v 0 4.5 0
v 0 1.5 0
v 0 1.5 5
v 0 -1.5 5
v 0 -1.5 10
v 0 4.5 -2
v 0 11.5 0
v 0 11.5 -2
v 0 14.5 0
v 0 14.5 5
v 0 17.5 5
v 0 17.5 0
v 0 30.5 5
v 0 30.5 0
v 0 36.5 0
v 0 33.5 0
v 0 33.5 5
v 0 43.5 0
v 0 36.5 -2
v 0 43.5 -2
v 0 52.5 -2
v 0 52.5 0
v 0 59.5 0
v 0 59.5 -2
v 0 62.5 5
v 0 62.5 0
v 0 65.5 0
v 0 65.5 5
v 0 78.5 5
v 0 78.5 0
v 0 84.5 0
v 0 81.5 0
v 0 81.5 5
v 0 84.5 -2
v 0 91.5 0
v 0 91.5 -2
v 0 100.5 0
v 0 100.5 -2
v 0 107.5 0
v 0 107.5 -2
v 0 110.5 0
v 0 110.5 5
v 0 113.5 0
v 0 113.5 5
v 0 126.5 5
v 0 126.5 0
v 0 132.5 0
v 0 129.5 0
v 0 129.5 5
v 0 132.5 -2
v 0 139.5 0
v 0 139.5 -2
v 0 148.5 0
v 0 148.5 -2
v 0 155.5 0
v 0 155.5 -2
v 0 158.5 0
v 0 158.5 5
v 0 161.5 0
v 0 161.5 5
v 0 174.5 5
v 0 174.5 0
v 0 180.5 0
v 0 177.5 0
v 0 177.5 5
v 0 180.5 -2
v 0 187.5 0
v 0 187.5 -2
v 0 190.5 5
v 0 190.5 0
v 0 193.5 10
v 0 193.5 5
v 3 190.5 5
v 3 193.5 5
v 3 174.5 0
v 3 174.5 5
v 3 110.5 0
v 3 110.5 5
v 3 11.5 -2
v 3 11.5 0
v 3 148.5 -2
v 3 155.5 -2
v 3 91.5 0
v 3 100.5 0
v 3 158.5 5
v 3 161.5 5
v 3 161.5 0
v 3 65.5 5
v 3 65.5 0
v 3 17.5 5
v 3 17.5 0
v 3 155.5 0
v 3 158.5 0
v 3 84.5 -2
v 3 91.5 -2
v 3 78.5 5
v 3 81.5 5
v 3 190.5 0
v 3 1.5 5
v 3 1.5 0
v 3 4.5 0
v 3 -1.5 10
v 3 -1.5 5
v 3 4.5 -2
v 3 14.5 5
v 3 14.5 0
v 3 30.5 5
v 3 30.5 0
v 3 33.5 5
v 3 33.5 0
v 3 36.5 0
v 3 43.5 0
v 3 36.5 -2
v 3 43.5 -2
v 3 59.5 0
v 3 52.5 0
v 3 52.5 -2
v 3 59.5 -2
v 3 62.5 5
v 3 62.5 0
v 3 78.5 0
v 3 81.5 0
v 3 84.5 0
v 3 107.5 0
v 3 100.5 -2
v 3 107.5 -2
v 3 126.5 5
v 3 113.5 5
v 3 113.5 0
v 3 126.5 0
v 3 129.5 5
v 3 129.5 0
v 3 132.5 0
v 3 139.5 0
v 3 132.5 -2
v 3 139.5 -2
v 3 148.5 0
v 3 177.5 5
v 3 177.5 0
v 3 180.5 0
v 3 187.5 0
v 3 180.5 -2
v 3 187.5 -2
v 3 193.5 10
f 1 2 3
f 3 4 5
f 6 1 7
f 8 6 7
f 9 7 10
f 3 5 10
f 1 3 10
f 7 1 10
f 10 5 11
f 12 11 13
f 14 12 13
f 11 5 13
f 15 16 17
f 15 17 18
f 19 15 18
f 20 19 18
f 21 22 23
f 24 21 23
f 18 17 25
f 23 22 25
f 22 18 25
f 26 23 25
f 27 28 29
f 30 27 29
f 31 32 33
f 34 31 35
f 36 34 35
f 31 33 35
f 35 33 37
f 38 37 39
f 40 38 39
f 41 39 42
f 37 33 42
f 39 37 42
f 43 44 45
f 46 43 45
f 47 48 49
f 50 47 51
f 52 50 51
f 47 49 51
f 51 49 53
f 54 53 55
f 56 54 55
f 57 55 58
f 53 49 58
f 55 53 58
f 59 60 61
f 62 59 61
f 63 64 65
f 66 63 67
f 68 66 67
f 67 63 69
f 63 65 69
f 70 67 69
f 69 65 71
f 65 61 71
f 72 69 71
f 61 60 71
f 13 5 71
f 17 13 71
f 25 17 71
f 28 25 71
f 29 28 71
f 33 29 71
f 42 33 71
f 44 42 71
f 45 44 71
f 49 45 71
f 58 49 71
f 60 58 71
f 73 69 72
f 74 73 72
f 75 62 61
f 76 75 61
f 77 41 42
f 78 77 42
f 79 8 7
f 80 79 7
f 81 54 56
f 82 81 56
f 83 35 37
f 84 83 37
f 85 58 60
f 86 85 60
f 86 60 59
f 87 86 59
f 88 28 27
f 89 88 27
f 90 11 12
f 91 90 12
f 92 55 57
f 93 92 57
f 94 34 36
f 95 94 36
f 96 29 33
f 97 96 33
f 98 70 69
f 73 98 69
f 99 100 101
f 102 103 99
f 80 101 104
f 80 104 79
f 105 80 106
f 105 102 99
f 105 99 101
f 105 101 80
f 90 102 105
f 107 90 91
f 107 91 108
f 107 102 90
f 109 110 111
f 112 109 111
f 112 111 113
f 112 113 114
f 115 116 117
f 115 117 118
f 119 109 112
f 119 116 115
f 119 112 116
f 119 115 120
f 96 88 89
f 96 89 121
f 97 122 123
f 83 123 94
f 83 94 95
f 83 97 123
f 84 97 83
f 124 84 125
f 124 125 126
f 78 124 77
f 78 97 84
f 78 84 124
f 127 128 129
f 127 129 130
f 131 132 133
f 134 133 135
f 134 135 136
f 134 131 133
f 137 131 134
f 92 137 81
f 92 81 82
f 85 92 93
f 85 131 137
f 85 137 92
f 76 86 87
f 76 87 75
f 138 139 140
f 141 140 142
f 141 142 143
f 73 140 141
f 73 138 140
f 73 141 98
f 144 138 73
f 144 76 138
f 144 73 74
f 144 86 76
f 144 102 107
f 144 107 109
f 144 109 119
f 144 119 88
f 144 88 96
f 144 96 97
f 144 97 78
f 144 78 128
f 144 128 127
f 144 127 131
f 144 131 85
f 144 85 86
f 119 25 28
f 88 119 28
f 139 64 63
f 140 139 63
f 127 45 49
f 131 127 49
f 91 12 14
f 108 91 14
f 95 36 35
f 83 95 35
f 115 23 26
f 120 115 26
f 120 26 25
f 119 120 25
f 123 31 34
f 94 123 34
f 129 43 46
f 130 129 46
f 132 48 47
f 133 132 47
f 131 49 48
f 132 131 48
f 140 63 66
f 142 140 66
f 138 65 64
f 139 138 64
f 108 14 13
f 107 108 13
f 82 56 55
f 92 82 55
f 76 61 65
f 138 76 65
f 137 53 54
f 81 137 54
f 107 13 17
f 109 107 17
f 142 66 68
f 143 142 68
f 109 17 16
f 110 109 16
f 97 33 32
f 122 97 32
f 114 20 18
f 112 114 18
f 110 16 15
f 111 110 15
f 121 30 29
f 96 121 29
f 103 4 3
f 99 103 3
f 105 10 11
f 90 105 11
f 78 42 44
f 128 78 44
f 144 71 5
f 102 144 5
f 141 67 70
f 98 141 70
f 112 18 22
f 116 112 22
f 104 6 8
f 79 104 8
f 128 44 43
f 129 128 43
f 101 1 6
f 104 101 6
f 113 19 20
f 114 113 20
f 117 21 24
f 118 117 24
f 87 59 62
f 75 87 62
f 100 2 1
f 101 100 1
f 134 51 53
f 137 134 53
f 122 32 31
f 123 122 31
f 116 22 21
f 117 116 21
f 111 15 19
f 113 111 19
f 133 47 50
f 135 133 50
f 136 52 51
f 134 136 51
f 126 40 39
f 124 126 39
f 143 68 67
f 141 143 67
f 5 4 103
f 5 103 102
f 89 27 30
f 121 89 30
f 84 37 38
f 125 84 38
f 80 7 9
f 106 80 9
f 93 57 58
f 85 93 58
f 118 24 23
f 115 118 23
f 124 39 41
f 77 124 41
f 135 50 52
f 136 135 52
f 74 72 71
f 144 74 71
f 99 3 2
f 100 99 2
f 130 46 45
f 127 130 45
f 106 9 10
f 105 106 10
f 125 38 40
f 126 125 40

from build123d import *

# Parameters (mm, degrees)
F0_W     = 3
F0_H     = 5
F0_W_2   = 1.5
F1_DEPTH = 3


with BuildPart() as f1:
    # F0 (on Right) → F1 (new body)
    with BuildSketch(Plane.YZ):
        Polygon((1.5, 5), (1.5, 0), (4.5, 0), (4.5, -2), (11.5, -2), (11.5, 0), (14.5, 0), (14.5, 5), (14.5, 10), (11.5, 10), (1.5, 10), align=None)
        with Locations((16, 7.5)):
            Rectangle(F0_W, F0_H)
        Polygon((20.5, 10), (17.5, 10), (17.5, 5), (17.5, 0), (30.5, 0), (30.5, 5), (30.5, 10), align=None)
        with Locations((32, 7.5)):
            Rectangle(F0_W, F0_H)
        Polygon((33.5, 5), (33.5, 0), (36.5, 0), (36.5, -2), (43.5, -2), (43.5, 0), (48, 0), (52.5, 0), (52.5, -2), (59.5, -2), (59.5, 0), (62.5, 0), (62.5, 5), (62.5, 10), (33.5, 10), align=None)
        with Locations((64, 7.5)):
            Rectangle(F0_W, F0_H)
        Polygon((78.5, 10), (65.5, 10), (65.5, 5), (65.5, 0), (78.5, 0), (78.5, 5), align=None)
        with Locations((80, 7.5)):
            Rectangle(F0_W, F0_H)
        Polygon((110.5, 10), (81.5, 10), (81.5, 5), (81.5, 0), (84.5, 0), (84.5, -2), (91.5, -2), (91.5, 0), (96, 0), (100.5, 0), (100.5, -2), (107.5, -2), (107.5, 0), (110.5, 0), (110.5, 5), align=None)
        with Locations((112, 7.5)):
            Rectangle(F0_W, F0_H)
        Polygon((126.5, 10), (113.5, 10), (113.5, 5), (113.5, 0), (126.5, 0), (126.5, 5), align=None)
        with Locations((128, 7.5)):
            Rectangle(F0_W, F0_H)
        Polygon((158.5, 10), (129.5, 10), (129.5, 5), (129.5, 0), (132.5, 0), (132.5, -2), (139.5, -2), (139.5, 0), (144, 0), (148.5, 0), (148.5, -2), (155.5, -2), (155.5, 0), (158.5, 0), (158.5, 5), align=None)
        with Locations((160, 7.5)):
            Rectangle(F0_W, F0_H)
        Polygon((171.5, 10), (161.5, 10), (161.5, 5), (161.5, 0), (174.5, 0), (174.5, 5), (174.5, 10), align=None)
        with Locations((176, 7.5)):
            Rectangle(F0_W, F0_H)
        Polygon((180.5, 10), (177.5, 10), (177.5, 5), (177.5, 0), (180.5, 0), (180.5, -2), (187.5, -2), (187.5, 0), (190.5, 0), (190.5, 5), (190.5, 10), align=None)
        with Locations((0.75, 7.5)):
            Rectangle(F0_W_2, F0_H)
        with Locations((191.25, 7.5)):
            Rectangle(F0_W_2, F0_H)
        with Locations((192.75, 7.5)):
            Rectangle(F0_W_2, F0_H)
        with Locations((-0.75, 7.5)):
            Rectangle(F0_W_2, F0_H)
    extrude(amount=F1_DEPTH)


solid = f1.part
